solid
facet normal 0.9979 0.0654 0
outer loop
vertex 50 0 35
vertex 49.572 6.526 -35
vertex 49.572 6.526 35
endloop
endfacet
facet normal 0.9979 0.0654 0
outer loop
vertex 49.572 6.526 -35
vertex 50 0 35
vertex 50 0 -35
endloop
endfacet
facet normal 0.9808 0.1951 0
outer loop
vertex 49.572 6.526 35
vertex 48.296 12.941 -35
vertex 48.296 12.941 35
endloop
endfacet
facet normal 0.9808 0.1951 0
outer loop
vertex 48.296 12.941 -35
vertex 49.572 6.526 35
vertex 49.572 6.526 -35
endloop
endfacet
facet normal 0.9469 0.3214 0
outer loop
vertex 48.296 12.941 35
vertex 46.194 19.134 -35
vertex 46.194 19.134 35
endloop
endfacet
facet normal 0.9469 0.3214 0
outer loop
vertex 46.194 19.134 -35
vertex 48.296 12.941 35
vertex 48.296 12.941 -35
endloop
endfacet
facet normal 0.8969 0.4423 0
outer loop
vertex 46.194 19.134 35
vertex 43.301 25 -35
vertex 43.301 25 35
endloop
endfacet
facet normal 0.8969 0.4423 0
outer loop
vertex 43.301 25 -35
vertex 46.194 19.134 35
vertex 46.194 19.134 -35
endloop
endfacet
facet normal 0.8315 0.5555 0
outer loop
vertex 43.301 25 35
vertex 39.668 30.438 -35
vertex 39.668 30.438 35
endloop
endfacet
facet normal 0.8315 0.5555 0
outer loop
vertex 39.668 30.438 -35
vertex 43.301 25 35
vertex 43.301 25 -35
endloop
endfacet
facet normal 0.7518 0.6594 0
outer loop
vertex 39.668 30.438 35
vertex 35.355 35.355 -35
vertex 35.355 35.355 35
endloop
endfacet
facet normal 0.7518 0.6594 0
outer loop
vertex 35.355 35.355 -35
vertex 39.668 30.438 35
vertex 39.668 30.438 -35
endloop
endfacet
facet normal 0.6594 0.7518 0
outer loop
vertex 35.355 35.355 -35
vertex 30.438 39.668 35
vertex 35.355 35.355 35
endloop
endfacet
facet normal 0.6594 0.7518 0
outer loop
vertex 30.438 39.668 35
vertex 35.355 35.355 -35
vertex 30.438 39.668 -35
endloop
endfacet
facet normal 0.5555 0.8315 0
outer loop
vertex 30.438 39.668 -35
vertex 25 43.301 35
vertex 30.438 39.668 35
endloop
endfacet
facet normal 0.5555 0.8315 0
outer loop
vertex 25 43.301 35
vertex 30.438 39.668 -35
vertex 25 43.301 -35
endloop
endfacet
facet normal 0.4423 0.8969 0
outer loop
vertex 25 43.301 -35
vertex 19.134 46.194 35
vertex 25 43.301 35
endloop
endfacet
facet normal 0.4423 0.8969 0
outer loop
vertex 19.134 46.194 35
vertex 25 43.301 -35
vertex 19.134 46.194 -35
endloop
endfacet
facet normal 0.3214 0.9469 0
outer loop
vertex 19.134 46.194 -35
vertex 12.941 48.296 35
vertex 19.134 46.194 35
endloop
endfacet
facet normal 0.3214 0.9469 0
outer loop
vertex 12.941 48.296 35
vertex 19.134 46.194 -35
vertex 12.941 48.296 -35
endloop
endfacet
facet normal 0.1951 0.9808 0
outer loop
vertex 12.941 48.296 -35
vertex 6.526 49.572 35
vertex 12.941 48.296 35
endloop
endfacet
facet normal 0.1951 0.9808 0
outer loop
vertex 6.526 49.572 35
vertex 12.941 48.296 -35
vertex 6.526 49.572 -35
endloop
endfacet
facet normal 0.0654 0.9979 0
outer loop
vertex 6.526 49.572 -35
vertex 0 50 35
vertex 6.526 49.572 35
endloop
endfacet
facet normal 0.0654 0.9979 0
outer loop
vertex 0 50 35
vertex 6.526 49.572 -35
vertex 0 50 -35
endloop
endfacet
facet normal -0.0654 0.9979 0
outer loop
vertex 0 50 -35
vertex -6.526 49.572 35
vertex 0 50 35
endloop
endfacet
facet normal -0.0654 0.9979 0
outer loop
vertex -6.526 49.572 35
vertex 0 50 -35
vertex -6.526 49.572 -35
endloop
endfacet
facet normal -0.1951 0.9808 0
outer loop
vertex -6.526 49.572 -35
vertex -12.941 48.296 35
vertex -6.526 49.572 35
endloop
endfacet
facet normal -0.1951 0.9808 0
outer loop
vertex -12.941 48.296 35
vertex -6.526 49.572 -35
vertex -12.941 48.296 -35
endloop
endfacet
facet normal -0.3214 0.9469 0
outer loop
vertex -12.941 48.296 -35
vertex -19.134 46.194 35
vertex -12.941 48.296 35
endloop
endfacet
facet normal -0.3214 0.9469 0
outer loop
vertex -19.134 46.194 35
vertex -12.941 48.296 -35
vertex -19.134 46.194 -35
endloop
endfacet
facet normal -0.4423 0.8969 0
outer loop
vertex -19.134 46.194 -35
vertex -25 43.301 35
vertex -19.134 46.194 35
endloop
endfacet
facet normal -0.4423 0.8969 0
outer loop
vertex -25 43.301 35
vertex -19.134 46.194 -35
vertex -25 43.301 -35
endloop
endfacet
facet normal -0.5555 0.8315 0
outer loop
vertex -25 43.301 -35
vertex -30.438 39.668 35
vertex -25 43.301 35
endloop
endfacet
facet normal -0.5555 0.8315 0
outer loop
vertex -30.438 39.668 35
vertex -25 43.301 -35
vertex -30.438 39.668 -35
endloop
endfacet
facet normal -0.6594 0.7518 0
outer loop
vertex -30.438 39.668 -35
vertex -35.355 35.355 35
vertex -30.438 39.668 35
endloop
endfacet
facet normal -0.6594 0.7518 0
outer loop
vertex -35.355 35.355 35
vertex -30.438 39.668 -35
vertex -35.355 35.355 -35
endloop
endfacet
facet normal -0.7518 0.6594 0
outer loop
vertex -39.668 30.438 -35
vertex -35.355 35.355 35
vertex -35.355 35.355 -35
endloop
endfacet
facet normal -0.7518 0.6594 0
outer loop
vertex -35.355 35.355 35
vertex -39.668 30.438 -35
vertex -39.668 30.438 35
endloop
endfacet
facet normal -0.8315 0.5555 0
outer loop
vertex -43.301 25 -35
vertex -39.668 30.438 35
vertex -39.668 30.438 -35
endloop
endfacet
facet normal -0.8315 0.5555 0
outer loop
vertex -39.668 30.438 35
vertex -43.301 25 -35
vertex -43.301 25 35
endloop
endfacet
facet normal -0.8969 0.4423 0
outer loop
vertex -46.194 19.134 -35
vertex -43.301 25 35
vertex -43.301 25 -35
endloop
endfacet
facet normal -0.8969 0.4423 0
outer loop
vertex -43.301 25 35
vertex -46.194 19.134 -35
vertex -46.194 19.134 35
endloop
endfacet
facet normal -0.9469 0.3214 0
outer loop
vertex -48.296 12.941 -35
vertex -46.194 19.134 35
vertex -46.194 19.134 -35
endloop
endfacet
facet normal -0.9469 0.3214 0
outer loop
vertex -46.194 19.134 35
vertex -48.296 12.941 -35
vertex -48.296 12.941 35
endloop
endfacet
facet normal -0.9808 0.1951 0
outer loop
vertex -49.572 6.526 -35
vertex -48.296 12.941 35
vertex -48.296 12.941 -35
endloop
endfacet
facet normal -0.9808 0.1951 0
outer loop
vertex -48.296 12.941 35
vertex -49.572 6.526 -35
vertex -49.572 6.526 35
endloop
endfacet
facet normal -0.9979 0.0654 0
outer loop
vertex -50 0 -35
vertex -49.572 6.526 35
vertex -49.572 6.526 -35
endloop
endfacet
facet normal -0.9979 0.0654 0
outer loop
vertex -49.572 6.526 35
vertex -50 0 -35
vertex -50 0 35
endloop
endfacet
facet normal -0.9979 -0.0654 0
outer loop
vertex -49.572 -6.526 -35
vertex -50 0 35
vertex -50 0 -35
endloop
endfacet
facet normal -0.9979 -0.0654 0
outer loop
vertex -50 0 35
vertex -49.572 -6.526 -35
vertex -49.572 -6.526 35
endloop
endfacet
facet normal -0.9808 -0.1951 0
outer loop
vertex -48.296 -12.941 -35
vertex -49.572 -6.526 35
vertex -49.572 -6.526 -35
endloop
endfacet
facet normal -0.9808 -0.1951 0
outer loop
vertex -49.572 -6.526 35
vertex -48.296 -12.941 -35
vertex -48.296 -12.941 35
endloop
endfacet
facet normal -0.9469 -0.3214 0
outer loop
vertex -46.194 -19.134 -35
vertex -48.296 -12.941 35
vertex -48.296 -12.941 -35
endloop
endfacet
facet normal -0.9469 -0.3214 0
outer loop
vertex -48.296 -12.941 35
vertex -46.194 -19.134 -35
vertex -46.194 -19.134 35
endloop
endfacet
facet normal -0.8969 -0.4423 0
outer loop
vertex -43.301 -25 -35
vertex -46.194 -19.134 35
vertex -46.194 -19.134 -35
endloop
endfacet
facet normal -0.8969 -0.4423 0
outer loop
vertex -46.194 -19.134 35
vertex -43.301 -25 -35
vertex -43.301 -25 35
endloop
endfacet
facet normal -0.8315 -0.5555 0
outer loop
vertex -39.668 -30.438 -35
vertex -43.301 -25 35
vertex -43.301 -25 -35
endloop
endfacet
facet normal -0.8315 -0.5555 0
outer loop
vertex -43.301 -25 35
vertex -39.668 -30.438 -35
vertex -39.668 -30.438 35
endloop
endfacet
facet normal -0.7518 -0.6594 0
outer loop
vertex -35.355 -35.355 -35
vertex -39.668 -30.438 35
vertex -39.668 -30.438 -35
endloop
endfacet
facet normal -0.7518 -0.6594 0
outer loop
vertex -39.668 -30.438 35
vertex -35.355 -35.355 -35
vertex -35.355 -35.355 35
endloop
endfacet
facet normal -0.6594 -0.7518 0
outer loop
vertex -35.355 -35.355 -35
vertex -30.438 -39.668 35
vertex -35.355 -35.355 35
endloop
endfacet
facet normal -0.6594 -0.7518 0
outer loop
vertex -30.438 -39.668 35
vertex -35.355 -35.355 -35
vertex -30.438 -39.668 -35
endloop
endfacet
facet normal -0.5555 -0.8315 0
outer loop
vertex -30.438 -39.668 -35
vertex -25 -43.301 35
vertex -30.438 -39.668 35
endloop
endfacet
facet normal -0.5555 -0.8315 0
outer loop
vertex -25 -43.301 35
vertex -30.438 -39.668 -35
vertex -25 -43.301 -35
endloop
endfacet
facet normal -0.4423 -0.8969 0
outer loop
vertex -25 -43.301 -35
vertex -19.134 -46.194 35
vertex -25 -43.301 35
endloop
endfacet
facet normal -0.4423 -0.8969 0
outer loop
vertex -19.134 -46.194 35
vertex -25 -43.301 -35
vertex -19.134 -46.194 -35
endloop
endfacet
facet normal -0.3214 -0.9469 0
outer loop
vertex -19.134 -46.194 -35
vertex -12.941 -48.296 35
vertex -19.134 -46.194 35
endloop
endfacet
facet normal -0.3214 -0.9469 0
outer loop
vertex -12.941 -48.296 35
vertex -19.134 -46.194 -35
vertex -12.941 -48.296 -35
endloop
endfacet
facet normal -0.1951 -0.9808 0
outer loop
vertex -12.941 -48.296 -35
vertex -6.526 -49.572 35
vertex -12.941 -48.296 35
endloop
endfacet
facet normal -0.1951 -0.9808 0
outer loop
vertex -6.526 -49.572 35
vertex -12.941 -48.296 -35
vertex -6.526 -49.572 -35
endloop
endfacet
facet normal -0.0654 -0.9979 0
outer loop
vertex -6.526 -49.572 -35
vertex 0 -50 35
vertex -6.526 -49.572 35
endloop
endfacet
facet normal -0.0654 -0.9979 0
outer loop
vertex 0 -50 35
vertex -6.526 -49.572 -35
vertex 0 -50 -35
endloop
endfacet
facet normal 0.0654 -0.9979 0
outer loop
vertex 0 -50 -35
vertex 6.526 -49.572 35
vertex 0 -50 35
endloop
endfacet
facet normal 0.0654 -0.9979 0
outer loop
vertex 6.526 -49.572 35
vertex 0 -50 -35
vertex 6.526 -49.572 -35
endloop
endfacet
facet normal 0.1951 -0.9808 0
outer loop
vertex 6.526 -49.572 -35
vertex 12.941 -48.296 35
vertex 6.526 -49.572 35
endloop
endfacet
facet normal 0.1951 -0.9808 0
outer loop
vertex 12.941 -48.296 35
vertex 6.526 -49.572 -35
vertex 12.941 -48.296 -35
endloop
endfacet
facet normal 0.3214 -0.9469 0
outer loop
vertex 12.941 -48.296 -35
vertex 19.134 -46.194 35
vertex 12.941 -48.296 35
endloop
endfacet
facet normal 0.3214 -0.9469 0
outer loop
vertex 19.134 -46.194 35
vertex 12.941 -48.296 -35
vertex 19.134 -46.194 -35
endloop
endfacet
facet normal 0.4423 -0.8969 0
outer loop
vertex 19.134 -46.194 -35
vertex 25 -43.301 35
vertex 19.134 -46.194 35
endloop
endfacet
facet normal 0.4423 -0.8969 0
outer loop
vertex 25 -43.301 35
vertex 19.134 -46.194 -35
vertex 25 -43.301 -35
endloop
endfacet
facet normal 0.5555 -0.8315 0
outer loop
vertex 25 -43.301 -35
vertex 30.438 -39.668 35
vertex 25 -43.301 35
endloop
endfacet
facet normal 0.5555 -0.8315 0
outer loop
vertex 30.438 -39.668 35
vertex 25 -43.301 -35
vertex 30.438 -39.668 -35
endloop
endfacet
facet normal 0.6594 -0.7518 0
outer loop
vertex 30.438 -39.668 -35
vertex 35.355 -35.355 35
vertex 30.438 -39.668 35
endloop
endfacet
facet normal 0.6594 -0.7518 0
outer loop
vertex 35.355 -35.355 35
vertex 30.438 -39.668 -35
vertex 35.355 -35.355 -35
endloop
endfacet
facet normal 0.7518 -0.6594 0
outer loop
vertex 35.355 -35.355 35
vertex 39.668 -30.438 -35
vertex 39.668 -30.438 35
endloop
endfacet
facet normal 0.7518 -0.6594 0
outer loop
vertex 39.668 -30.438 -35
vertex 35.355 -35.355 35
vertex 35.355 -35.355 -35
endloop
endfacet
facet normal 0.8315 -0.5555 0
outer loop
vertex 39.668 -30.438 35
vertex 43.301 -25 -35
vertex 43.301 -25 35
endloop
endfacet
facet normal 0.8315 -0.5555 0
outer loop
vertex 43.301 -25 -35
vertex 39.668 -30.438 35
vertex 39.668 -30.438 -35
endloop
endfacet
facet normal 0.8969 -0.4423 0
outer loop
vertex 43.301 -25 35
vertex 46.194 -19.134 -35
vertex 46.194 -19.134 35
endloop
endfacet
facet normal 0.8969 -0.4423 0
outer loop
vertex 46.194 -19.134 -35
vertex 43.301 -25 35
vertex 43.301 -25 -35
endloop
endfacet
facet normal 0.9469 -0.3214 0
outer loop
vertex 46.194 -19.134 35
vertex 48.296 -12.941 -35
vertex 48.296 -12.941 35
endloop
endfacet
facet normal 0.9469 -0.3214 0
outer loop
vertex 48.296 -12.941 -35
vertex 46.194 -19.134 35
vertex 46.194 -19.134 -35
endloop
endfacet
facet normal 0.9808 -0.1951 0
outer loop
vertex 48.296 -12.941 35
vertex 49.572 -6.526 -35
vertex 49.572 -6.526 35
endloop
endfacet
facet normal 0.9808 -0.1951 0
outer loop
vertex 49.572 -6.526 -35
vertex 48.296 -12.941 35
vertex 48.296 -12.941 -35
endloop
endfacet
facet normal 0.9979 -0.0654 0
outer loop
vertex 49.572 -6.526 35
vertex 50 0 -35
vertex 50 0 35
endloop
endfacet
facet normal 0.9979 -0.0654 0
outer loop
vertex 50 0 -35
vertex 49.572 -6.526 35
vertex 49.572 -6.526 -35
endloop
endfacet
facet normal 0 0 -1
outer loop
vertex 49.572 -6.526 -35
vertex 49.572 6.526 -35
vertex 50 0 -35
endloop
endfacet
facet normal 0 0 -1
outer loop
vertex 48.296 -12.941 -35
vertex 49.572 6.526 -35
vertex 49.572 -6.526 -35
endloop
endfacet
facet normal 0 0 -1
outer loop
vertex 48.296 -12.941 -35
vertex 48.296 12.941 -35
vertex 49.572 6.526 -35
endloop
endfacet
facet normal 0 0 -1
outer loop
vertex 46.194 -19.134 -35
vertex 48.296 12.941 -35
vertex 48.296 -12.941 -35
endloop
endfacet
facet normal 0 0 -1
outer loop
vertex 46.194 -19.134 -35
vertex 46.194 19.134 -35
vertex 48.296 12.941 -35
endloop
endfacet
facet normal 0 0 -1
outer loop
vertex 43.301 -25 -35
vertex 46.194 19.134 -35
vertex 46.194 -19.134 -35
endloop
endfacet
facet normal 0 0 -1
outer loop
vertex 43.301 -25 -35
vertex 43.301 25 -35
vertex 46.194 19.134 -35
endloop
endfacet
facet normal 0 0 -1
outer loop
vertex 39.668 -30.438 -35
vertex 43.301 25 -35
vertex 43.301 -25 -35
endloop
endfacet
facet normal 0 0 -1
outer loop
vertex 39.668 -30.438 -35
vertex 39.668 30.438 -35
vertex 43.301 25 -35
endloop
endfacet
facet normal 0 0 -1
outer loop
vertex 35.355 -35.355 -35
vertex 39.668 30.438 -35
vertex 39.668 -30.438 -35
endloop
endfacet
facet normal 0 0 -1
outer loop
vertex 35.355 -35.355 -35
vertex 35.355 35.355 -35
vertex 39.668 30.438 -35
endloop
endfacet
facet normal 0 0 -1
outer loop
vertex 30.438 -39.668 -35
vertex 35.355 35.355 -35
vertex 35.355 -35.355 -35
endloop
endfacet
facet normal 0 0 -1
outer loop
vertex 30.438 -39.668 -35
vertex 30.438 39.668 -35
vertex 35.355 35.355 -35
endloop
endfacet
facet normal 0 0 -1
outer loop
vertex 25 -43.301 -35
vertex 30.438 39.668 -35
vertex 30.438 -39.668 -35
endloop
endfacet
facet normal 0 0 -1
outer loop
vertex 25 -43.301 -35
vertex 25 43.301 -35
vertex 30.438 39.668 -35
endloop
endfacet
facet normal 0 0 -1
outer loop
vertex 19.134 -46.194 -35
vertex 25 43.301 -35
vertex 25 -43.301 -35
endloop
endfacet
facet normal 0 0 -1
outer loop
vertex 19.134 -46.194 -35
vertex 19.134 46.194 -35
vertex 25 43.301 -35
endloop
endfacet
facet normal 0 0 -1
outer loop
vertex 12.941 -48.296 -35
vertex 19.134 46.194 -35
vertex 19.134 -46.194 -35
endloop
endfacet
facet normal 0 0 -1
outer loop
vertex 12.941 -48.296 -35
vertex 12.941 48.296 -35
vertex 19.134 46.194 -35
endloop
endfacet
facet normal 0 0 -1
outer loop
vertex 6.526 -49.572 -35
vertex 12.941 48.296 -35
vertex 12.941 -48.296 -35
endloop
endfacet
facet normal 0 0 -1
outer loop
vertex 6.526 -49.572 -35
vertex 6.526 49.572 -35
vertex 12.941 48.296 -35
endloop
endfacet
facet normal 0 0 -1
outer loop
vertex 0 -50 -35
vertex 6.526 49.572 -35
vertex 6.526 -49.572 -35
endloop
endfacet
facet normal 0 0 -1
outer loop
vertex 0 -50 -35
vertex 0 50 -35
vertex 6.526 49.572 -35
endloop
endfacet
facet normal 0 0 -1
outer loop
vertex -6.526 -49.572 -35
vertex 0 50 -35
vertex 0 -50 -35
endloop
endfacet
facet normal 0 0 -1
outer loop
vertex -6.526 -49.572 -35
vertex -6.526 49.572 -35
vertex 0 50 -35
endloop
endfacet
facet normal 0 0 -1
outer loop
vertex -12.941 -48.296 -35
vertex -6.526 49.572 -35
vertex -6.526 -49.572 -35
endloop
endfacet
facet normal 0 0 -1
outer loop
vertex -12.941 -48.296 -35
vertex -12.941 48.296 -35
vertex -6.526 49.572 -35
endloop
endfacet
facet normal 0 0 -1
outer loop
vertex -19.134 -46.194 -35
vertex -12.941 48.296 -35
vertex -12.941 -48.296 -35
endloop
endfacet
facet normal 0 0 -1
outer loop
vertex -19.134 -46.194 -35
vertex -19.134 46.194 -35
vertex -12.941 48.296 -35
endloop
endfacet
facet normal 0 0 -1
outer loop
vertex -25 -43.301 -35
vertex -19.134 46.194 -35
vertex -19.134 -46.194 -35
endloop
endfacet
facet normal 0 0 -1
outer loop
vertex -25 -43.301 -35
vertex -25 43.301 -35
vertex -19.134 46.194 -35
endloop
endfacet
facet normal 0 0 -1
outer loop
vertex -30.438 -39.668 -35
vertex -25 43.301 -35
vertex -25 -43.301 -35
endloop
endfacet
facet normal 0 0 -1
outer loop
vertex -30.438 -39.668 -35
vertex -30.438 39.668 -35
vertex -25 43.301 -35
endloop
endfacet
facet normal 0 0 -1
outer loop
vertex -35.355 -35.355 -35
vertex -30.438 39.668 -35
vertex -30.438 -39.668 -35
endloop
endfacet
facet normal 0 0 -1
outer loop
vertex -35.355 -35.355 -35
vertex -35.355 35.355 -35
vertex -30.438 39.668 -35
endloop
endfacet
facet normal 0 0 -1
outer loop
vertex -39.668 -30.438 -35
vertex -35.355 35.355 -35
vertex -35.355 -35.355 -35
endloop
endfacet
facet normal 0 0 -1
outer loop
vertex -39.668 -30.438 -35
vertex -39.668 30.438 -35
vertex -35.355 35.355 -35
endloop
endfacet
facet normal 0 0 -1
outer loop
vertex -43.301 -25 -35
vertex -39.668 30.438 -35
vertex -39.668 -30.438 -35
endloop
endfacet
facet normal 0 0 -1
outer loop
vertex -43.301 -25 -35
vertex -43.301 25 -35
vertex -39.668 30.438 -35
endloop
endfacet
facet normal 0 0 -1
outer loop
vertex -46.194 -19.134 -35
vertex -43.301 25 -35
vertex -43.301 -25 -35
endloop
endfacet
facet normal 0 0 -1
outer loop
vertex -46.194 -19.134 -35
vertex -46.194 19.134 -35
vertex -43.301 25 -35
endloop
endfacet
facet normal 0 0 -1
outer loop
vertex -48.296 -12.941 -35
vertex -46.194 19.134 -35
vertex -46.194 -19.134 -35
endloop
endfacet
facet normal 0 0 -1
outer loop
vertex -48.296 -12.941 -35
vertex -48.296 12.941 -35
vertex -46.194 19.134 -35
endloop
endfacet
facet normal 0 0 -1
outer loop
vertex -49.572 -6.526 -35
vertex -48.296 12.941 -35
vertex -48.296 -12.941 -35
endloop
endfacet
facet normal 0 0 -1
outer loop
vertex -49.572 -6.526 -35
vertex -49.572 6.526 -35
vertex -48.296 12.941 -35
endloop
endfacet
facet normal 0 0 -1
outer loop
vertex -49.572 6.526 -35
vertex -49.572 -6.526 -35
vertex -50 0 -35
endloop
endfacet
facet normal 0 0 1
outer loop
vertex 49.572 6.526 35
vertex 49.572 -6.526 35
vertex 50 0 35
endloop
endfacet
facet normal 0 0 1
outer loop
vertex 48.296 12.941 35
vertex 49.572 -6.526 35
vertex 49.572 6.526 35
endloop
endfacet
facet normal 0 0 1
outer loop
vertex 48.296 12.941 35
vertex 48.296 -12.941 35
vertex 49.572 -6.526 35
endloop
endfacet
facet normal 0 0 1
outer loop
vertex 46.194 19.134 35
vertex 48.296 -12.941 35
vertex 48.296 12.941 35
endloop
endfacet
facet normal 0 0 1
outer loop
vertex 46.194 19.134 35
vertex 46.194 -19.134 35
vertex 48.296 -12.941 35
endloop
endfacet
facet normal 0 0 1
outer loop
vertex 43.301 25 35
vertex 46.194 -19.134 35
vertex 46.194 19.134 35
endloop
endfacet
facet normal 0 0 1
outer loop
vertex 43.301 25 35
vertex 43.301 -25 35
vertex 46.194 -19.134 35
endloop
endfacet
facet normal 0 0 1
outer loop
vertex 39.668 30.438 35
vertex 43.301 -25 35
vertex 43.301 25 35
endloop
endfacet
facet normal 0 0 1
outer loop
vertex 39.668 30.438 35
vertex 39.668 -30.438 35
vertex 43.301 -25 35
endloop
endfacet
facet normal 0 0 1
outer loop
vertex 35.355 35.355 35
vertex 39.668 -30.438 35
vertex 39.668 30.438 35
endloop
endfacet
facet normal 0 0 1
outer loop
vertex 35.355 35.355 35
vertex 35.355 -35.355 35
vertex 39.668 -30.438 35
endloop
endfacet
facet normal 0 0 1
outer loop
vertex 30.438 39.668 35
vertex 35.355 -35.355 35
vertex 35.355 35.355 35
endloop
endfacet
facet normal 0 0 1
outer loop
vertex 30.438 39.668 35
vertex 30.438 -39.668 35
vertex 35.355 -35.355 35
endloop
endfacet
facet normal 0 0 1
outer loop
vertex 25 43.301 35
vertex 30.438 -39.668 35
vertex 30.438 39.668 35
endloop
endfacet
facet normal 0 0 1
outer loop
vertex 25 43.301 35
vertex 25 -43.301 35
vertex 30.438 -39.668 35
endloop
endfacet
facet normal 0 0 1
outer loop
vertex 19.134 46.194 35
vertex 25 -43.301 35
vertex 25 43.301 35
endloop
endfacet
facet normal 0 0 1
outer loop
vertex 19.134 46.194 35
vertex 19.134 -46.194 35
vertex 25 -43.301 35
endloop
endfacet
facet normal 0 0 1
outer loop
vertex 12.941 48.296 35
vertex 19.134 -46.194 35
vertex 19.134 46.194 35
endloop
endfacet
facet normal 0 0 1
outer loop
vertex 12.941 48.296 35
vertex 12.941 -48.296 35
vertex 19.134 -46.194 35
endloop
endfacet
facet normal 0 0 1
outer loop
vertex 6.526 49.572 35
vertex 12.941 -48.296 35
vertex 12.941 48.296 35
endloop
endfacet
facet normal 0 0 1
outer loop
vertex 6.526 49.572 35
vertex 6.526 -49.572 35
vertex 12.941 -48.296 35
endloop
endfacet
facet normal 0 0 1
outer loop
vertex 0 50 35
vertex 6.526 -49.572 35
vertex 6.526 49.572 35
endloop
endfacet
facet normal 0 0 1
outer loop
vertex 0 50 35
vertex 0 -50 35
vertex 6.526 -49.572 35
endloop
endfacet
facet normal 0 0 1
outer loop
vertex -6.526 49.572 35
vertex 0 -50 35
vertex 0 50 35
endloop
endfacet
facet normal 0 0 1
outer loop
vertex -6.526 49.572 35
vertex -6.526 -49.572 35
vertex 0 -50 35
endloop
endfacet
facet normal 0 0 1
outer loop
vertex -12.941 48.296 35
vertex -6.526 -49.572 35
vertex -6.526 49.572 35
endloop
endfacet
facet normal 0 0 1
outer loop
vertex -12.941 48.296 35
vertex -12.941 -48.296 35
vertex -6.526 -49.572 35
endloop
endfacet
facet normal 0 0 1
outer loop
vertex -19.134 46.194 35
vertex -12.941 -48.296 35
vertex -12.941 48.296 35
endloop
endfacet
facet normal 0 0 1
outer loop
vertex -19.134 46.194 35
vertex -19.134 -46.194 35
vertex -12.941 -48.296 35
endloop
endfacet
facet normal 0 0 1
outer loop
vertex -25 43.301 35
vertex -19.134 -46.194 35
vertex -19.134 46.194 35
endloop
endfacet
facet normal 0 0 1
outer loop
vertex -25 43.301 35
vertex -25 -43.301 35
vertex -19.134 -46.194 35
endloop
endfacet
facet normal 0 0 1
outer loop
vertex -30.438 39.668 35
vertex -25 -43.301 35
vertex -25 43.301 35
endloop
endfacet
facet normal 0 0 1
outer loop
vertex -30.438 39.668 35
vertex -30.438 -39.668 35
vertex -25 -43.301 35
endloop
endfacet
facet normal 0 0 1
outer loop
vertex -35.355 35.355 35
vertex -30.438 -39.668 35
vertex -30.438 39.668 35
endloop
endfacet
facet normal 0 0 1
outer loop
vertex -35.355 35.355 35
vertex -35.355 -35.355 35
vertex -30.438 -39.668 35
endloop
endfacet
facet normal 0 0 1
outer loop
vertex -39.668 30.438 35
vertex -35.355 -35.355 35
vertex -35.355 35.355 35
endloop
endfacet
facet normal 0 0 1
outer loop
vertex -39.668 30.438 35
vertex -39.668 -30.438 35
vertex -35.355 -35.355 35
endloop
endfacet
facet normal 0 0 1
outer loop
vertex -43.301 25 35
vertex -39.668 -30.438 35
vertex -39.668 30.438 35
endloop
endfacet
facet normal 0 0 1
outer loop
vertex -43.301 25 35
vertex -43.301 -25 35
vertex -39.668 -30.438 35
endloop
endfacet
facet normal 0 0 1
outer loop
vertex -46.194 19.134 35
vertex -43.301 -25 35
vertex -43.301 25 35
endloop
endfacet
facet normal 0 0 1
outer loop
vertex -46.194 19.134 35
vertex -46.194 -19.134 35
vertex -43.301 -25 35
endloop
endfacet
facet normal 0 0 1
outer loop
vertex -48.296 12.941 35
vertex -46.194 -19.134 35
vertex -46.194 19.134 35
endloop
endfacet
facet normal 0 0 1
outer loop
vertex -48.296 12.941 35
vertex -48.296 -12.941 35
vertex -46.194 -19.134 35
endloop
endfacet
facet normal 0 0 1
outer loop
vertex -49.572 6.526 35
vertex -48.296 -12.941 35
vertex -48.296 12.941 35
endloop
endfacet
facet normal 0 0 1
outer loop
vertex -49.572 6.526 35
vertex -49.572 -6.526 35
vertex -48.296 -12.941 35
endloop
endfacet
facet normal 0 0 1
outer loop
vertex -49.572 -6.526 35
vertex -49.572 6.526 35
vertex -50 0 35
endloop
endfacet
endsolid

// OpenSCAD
// ========================================
// a cylinder with radius 50 mm and height 70 mm
// NeuroCAD canonical IR; dimensions are millimetres
// ========================================
$fn = 48;

cylinder(r=50, h=70, center=true);
